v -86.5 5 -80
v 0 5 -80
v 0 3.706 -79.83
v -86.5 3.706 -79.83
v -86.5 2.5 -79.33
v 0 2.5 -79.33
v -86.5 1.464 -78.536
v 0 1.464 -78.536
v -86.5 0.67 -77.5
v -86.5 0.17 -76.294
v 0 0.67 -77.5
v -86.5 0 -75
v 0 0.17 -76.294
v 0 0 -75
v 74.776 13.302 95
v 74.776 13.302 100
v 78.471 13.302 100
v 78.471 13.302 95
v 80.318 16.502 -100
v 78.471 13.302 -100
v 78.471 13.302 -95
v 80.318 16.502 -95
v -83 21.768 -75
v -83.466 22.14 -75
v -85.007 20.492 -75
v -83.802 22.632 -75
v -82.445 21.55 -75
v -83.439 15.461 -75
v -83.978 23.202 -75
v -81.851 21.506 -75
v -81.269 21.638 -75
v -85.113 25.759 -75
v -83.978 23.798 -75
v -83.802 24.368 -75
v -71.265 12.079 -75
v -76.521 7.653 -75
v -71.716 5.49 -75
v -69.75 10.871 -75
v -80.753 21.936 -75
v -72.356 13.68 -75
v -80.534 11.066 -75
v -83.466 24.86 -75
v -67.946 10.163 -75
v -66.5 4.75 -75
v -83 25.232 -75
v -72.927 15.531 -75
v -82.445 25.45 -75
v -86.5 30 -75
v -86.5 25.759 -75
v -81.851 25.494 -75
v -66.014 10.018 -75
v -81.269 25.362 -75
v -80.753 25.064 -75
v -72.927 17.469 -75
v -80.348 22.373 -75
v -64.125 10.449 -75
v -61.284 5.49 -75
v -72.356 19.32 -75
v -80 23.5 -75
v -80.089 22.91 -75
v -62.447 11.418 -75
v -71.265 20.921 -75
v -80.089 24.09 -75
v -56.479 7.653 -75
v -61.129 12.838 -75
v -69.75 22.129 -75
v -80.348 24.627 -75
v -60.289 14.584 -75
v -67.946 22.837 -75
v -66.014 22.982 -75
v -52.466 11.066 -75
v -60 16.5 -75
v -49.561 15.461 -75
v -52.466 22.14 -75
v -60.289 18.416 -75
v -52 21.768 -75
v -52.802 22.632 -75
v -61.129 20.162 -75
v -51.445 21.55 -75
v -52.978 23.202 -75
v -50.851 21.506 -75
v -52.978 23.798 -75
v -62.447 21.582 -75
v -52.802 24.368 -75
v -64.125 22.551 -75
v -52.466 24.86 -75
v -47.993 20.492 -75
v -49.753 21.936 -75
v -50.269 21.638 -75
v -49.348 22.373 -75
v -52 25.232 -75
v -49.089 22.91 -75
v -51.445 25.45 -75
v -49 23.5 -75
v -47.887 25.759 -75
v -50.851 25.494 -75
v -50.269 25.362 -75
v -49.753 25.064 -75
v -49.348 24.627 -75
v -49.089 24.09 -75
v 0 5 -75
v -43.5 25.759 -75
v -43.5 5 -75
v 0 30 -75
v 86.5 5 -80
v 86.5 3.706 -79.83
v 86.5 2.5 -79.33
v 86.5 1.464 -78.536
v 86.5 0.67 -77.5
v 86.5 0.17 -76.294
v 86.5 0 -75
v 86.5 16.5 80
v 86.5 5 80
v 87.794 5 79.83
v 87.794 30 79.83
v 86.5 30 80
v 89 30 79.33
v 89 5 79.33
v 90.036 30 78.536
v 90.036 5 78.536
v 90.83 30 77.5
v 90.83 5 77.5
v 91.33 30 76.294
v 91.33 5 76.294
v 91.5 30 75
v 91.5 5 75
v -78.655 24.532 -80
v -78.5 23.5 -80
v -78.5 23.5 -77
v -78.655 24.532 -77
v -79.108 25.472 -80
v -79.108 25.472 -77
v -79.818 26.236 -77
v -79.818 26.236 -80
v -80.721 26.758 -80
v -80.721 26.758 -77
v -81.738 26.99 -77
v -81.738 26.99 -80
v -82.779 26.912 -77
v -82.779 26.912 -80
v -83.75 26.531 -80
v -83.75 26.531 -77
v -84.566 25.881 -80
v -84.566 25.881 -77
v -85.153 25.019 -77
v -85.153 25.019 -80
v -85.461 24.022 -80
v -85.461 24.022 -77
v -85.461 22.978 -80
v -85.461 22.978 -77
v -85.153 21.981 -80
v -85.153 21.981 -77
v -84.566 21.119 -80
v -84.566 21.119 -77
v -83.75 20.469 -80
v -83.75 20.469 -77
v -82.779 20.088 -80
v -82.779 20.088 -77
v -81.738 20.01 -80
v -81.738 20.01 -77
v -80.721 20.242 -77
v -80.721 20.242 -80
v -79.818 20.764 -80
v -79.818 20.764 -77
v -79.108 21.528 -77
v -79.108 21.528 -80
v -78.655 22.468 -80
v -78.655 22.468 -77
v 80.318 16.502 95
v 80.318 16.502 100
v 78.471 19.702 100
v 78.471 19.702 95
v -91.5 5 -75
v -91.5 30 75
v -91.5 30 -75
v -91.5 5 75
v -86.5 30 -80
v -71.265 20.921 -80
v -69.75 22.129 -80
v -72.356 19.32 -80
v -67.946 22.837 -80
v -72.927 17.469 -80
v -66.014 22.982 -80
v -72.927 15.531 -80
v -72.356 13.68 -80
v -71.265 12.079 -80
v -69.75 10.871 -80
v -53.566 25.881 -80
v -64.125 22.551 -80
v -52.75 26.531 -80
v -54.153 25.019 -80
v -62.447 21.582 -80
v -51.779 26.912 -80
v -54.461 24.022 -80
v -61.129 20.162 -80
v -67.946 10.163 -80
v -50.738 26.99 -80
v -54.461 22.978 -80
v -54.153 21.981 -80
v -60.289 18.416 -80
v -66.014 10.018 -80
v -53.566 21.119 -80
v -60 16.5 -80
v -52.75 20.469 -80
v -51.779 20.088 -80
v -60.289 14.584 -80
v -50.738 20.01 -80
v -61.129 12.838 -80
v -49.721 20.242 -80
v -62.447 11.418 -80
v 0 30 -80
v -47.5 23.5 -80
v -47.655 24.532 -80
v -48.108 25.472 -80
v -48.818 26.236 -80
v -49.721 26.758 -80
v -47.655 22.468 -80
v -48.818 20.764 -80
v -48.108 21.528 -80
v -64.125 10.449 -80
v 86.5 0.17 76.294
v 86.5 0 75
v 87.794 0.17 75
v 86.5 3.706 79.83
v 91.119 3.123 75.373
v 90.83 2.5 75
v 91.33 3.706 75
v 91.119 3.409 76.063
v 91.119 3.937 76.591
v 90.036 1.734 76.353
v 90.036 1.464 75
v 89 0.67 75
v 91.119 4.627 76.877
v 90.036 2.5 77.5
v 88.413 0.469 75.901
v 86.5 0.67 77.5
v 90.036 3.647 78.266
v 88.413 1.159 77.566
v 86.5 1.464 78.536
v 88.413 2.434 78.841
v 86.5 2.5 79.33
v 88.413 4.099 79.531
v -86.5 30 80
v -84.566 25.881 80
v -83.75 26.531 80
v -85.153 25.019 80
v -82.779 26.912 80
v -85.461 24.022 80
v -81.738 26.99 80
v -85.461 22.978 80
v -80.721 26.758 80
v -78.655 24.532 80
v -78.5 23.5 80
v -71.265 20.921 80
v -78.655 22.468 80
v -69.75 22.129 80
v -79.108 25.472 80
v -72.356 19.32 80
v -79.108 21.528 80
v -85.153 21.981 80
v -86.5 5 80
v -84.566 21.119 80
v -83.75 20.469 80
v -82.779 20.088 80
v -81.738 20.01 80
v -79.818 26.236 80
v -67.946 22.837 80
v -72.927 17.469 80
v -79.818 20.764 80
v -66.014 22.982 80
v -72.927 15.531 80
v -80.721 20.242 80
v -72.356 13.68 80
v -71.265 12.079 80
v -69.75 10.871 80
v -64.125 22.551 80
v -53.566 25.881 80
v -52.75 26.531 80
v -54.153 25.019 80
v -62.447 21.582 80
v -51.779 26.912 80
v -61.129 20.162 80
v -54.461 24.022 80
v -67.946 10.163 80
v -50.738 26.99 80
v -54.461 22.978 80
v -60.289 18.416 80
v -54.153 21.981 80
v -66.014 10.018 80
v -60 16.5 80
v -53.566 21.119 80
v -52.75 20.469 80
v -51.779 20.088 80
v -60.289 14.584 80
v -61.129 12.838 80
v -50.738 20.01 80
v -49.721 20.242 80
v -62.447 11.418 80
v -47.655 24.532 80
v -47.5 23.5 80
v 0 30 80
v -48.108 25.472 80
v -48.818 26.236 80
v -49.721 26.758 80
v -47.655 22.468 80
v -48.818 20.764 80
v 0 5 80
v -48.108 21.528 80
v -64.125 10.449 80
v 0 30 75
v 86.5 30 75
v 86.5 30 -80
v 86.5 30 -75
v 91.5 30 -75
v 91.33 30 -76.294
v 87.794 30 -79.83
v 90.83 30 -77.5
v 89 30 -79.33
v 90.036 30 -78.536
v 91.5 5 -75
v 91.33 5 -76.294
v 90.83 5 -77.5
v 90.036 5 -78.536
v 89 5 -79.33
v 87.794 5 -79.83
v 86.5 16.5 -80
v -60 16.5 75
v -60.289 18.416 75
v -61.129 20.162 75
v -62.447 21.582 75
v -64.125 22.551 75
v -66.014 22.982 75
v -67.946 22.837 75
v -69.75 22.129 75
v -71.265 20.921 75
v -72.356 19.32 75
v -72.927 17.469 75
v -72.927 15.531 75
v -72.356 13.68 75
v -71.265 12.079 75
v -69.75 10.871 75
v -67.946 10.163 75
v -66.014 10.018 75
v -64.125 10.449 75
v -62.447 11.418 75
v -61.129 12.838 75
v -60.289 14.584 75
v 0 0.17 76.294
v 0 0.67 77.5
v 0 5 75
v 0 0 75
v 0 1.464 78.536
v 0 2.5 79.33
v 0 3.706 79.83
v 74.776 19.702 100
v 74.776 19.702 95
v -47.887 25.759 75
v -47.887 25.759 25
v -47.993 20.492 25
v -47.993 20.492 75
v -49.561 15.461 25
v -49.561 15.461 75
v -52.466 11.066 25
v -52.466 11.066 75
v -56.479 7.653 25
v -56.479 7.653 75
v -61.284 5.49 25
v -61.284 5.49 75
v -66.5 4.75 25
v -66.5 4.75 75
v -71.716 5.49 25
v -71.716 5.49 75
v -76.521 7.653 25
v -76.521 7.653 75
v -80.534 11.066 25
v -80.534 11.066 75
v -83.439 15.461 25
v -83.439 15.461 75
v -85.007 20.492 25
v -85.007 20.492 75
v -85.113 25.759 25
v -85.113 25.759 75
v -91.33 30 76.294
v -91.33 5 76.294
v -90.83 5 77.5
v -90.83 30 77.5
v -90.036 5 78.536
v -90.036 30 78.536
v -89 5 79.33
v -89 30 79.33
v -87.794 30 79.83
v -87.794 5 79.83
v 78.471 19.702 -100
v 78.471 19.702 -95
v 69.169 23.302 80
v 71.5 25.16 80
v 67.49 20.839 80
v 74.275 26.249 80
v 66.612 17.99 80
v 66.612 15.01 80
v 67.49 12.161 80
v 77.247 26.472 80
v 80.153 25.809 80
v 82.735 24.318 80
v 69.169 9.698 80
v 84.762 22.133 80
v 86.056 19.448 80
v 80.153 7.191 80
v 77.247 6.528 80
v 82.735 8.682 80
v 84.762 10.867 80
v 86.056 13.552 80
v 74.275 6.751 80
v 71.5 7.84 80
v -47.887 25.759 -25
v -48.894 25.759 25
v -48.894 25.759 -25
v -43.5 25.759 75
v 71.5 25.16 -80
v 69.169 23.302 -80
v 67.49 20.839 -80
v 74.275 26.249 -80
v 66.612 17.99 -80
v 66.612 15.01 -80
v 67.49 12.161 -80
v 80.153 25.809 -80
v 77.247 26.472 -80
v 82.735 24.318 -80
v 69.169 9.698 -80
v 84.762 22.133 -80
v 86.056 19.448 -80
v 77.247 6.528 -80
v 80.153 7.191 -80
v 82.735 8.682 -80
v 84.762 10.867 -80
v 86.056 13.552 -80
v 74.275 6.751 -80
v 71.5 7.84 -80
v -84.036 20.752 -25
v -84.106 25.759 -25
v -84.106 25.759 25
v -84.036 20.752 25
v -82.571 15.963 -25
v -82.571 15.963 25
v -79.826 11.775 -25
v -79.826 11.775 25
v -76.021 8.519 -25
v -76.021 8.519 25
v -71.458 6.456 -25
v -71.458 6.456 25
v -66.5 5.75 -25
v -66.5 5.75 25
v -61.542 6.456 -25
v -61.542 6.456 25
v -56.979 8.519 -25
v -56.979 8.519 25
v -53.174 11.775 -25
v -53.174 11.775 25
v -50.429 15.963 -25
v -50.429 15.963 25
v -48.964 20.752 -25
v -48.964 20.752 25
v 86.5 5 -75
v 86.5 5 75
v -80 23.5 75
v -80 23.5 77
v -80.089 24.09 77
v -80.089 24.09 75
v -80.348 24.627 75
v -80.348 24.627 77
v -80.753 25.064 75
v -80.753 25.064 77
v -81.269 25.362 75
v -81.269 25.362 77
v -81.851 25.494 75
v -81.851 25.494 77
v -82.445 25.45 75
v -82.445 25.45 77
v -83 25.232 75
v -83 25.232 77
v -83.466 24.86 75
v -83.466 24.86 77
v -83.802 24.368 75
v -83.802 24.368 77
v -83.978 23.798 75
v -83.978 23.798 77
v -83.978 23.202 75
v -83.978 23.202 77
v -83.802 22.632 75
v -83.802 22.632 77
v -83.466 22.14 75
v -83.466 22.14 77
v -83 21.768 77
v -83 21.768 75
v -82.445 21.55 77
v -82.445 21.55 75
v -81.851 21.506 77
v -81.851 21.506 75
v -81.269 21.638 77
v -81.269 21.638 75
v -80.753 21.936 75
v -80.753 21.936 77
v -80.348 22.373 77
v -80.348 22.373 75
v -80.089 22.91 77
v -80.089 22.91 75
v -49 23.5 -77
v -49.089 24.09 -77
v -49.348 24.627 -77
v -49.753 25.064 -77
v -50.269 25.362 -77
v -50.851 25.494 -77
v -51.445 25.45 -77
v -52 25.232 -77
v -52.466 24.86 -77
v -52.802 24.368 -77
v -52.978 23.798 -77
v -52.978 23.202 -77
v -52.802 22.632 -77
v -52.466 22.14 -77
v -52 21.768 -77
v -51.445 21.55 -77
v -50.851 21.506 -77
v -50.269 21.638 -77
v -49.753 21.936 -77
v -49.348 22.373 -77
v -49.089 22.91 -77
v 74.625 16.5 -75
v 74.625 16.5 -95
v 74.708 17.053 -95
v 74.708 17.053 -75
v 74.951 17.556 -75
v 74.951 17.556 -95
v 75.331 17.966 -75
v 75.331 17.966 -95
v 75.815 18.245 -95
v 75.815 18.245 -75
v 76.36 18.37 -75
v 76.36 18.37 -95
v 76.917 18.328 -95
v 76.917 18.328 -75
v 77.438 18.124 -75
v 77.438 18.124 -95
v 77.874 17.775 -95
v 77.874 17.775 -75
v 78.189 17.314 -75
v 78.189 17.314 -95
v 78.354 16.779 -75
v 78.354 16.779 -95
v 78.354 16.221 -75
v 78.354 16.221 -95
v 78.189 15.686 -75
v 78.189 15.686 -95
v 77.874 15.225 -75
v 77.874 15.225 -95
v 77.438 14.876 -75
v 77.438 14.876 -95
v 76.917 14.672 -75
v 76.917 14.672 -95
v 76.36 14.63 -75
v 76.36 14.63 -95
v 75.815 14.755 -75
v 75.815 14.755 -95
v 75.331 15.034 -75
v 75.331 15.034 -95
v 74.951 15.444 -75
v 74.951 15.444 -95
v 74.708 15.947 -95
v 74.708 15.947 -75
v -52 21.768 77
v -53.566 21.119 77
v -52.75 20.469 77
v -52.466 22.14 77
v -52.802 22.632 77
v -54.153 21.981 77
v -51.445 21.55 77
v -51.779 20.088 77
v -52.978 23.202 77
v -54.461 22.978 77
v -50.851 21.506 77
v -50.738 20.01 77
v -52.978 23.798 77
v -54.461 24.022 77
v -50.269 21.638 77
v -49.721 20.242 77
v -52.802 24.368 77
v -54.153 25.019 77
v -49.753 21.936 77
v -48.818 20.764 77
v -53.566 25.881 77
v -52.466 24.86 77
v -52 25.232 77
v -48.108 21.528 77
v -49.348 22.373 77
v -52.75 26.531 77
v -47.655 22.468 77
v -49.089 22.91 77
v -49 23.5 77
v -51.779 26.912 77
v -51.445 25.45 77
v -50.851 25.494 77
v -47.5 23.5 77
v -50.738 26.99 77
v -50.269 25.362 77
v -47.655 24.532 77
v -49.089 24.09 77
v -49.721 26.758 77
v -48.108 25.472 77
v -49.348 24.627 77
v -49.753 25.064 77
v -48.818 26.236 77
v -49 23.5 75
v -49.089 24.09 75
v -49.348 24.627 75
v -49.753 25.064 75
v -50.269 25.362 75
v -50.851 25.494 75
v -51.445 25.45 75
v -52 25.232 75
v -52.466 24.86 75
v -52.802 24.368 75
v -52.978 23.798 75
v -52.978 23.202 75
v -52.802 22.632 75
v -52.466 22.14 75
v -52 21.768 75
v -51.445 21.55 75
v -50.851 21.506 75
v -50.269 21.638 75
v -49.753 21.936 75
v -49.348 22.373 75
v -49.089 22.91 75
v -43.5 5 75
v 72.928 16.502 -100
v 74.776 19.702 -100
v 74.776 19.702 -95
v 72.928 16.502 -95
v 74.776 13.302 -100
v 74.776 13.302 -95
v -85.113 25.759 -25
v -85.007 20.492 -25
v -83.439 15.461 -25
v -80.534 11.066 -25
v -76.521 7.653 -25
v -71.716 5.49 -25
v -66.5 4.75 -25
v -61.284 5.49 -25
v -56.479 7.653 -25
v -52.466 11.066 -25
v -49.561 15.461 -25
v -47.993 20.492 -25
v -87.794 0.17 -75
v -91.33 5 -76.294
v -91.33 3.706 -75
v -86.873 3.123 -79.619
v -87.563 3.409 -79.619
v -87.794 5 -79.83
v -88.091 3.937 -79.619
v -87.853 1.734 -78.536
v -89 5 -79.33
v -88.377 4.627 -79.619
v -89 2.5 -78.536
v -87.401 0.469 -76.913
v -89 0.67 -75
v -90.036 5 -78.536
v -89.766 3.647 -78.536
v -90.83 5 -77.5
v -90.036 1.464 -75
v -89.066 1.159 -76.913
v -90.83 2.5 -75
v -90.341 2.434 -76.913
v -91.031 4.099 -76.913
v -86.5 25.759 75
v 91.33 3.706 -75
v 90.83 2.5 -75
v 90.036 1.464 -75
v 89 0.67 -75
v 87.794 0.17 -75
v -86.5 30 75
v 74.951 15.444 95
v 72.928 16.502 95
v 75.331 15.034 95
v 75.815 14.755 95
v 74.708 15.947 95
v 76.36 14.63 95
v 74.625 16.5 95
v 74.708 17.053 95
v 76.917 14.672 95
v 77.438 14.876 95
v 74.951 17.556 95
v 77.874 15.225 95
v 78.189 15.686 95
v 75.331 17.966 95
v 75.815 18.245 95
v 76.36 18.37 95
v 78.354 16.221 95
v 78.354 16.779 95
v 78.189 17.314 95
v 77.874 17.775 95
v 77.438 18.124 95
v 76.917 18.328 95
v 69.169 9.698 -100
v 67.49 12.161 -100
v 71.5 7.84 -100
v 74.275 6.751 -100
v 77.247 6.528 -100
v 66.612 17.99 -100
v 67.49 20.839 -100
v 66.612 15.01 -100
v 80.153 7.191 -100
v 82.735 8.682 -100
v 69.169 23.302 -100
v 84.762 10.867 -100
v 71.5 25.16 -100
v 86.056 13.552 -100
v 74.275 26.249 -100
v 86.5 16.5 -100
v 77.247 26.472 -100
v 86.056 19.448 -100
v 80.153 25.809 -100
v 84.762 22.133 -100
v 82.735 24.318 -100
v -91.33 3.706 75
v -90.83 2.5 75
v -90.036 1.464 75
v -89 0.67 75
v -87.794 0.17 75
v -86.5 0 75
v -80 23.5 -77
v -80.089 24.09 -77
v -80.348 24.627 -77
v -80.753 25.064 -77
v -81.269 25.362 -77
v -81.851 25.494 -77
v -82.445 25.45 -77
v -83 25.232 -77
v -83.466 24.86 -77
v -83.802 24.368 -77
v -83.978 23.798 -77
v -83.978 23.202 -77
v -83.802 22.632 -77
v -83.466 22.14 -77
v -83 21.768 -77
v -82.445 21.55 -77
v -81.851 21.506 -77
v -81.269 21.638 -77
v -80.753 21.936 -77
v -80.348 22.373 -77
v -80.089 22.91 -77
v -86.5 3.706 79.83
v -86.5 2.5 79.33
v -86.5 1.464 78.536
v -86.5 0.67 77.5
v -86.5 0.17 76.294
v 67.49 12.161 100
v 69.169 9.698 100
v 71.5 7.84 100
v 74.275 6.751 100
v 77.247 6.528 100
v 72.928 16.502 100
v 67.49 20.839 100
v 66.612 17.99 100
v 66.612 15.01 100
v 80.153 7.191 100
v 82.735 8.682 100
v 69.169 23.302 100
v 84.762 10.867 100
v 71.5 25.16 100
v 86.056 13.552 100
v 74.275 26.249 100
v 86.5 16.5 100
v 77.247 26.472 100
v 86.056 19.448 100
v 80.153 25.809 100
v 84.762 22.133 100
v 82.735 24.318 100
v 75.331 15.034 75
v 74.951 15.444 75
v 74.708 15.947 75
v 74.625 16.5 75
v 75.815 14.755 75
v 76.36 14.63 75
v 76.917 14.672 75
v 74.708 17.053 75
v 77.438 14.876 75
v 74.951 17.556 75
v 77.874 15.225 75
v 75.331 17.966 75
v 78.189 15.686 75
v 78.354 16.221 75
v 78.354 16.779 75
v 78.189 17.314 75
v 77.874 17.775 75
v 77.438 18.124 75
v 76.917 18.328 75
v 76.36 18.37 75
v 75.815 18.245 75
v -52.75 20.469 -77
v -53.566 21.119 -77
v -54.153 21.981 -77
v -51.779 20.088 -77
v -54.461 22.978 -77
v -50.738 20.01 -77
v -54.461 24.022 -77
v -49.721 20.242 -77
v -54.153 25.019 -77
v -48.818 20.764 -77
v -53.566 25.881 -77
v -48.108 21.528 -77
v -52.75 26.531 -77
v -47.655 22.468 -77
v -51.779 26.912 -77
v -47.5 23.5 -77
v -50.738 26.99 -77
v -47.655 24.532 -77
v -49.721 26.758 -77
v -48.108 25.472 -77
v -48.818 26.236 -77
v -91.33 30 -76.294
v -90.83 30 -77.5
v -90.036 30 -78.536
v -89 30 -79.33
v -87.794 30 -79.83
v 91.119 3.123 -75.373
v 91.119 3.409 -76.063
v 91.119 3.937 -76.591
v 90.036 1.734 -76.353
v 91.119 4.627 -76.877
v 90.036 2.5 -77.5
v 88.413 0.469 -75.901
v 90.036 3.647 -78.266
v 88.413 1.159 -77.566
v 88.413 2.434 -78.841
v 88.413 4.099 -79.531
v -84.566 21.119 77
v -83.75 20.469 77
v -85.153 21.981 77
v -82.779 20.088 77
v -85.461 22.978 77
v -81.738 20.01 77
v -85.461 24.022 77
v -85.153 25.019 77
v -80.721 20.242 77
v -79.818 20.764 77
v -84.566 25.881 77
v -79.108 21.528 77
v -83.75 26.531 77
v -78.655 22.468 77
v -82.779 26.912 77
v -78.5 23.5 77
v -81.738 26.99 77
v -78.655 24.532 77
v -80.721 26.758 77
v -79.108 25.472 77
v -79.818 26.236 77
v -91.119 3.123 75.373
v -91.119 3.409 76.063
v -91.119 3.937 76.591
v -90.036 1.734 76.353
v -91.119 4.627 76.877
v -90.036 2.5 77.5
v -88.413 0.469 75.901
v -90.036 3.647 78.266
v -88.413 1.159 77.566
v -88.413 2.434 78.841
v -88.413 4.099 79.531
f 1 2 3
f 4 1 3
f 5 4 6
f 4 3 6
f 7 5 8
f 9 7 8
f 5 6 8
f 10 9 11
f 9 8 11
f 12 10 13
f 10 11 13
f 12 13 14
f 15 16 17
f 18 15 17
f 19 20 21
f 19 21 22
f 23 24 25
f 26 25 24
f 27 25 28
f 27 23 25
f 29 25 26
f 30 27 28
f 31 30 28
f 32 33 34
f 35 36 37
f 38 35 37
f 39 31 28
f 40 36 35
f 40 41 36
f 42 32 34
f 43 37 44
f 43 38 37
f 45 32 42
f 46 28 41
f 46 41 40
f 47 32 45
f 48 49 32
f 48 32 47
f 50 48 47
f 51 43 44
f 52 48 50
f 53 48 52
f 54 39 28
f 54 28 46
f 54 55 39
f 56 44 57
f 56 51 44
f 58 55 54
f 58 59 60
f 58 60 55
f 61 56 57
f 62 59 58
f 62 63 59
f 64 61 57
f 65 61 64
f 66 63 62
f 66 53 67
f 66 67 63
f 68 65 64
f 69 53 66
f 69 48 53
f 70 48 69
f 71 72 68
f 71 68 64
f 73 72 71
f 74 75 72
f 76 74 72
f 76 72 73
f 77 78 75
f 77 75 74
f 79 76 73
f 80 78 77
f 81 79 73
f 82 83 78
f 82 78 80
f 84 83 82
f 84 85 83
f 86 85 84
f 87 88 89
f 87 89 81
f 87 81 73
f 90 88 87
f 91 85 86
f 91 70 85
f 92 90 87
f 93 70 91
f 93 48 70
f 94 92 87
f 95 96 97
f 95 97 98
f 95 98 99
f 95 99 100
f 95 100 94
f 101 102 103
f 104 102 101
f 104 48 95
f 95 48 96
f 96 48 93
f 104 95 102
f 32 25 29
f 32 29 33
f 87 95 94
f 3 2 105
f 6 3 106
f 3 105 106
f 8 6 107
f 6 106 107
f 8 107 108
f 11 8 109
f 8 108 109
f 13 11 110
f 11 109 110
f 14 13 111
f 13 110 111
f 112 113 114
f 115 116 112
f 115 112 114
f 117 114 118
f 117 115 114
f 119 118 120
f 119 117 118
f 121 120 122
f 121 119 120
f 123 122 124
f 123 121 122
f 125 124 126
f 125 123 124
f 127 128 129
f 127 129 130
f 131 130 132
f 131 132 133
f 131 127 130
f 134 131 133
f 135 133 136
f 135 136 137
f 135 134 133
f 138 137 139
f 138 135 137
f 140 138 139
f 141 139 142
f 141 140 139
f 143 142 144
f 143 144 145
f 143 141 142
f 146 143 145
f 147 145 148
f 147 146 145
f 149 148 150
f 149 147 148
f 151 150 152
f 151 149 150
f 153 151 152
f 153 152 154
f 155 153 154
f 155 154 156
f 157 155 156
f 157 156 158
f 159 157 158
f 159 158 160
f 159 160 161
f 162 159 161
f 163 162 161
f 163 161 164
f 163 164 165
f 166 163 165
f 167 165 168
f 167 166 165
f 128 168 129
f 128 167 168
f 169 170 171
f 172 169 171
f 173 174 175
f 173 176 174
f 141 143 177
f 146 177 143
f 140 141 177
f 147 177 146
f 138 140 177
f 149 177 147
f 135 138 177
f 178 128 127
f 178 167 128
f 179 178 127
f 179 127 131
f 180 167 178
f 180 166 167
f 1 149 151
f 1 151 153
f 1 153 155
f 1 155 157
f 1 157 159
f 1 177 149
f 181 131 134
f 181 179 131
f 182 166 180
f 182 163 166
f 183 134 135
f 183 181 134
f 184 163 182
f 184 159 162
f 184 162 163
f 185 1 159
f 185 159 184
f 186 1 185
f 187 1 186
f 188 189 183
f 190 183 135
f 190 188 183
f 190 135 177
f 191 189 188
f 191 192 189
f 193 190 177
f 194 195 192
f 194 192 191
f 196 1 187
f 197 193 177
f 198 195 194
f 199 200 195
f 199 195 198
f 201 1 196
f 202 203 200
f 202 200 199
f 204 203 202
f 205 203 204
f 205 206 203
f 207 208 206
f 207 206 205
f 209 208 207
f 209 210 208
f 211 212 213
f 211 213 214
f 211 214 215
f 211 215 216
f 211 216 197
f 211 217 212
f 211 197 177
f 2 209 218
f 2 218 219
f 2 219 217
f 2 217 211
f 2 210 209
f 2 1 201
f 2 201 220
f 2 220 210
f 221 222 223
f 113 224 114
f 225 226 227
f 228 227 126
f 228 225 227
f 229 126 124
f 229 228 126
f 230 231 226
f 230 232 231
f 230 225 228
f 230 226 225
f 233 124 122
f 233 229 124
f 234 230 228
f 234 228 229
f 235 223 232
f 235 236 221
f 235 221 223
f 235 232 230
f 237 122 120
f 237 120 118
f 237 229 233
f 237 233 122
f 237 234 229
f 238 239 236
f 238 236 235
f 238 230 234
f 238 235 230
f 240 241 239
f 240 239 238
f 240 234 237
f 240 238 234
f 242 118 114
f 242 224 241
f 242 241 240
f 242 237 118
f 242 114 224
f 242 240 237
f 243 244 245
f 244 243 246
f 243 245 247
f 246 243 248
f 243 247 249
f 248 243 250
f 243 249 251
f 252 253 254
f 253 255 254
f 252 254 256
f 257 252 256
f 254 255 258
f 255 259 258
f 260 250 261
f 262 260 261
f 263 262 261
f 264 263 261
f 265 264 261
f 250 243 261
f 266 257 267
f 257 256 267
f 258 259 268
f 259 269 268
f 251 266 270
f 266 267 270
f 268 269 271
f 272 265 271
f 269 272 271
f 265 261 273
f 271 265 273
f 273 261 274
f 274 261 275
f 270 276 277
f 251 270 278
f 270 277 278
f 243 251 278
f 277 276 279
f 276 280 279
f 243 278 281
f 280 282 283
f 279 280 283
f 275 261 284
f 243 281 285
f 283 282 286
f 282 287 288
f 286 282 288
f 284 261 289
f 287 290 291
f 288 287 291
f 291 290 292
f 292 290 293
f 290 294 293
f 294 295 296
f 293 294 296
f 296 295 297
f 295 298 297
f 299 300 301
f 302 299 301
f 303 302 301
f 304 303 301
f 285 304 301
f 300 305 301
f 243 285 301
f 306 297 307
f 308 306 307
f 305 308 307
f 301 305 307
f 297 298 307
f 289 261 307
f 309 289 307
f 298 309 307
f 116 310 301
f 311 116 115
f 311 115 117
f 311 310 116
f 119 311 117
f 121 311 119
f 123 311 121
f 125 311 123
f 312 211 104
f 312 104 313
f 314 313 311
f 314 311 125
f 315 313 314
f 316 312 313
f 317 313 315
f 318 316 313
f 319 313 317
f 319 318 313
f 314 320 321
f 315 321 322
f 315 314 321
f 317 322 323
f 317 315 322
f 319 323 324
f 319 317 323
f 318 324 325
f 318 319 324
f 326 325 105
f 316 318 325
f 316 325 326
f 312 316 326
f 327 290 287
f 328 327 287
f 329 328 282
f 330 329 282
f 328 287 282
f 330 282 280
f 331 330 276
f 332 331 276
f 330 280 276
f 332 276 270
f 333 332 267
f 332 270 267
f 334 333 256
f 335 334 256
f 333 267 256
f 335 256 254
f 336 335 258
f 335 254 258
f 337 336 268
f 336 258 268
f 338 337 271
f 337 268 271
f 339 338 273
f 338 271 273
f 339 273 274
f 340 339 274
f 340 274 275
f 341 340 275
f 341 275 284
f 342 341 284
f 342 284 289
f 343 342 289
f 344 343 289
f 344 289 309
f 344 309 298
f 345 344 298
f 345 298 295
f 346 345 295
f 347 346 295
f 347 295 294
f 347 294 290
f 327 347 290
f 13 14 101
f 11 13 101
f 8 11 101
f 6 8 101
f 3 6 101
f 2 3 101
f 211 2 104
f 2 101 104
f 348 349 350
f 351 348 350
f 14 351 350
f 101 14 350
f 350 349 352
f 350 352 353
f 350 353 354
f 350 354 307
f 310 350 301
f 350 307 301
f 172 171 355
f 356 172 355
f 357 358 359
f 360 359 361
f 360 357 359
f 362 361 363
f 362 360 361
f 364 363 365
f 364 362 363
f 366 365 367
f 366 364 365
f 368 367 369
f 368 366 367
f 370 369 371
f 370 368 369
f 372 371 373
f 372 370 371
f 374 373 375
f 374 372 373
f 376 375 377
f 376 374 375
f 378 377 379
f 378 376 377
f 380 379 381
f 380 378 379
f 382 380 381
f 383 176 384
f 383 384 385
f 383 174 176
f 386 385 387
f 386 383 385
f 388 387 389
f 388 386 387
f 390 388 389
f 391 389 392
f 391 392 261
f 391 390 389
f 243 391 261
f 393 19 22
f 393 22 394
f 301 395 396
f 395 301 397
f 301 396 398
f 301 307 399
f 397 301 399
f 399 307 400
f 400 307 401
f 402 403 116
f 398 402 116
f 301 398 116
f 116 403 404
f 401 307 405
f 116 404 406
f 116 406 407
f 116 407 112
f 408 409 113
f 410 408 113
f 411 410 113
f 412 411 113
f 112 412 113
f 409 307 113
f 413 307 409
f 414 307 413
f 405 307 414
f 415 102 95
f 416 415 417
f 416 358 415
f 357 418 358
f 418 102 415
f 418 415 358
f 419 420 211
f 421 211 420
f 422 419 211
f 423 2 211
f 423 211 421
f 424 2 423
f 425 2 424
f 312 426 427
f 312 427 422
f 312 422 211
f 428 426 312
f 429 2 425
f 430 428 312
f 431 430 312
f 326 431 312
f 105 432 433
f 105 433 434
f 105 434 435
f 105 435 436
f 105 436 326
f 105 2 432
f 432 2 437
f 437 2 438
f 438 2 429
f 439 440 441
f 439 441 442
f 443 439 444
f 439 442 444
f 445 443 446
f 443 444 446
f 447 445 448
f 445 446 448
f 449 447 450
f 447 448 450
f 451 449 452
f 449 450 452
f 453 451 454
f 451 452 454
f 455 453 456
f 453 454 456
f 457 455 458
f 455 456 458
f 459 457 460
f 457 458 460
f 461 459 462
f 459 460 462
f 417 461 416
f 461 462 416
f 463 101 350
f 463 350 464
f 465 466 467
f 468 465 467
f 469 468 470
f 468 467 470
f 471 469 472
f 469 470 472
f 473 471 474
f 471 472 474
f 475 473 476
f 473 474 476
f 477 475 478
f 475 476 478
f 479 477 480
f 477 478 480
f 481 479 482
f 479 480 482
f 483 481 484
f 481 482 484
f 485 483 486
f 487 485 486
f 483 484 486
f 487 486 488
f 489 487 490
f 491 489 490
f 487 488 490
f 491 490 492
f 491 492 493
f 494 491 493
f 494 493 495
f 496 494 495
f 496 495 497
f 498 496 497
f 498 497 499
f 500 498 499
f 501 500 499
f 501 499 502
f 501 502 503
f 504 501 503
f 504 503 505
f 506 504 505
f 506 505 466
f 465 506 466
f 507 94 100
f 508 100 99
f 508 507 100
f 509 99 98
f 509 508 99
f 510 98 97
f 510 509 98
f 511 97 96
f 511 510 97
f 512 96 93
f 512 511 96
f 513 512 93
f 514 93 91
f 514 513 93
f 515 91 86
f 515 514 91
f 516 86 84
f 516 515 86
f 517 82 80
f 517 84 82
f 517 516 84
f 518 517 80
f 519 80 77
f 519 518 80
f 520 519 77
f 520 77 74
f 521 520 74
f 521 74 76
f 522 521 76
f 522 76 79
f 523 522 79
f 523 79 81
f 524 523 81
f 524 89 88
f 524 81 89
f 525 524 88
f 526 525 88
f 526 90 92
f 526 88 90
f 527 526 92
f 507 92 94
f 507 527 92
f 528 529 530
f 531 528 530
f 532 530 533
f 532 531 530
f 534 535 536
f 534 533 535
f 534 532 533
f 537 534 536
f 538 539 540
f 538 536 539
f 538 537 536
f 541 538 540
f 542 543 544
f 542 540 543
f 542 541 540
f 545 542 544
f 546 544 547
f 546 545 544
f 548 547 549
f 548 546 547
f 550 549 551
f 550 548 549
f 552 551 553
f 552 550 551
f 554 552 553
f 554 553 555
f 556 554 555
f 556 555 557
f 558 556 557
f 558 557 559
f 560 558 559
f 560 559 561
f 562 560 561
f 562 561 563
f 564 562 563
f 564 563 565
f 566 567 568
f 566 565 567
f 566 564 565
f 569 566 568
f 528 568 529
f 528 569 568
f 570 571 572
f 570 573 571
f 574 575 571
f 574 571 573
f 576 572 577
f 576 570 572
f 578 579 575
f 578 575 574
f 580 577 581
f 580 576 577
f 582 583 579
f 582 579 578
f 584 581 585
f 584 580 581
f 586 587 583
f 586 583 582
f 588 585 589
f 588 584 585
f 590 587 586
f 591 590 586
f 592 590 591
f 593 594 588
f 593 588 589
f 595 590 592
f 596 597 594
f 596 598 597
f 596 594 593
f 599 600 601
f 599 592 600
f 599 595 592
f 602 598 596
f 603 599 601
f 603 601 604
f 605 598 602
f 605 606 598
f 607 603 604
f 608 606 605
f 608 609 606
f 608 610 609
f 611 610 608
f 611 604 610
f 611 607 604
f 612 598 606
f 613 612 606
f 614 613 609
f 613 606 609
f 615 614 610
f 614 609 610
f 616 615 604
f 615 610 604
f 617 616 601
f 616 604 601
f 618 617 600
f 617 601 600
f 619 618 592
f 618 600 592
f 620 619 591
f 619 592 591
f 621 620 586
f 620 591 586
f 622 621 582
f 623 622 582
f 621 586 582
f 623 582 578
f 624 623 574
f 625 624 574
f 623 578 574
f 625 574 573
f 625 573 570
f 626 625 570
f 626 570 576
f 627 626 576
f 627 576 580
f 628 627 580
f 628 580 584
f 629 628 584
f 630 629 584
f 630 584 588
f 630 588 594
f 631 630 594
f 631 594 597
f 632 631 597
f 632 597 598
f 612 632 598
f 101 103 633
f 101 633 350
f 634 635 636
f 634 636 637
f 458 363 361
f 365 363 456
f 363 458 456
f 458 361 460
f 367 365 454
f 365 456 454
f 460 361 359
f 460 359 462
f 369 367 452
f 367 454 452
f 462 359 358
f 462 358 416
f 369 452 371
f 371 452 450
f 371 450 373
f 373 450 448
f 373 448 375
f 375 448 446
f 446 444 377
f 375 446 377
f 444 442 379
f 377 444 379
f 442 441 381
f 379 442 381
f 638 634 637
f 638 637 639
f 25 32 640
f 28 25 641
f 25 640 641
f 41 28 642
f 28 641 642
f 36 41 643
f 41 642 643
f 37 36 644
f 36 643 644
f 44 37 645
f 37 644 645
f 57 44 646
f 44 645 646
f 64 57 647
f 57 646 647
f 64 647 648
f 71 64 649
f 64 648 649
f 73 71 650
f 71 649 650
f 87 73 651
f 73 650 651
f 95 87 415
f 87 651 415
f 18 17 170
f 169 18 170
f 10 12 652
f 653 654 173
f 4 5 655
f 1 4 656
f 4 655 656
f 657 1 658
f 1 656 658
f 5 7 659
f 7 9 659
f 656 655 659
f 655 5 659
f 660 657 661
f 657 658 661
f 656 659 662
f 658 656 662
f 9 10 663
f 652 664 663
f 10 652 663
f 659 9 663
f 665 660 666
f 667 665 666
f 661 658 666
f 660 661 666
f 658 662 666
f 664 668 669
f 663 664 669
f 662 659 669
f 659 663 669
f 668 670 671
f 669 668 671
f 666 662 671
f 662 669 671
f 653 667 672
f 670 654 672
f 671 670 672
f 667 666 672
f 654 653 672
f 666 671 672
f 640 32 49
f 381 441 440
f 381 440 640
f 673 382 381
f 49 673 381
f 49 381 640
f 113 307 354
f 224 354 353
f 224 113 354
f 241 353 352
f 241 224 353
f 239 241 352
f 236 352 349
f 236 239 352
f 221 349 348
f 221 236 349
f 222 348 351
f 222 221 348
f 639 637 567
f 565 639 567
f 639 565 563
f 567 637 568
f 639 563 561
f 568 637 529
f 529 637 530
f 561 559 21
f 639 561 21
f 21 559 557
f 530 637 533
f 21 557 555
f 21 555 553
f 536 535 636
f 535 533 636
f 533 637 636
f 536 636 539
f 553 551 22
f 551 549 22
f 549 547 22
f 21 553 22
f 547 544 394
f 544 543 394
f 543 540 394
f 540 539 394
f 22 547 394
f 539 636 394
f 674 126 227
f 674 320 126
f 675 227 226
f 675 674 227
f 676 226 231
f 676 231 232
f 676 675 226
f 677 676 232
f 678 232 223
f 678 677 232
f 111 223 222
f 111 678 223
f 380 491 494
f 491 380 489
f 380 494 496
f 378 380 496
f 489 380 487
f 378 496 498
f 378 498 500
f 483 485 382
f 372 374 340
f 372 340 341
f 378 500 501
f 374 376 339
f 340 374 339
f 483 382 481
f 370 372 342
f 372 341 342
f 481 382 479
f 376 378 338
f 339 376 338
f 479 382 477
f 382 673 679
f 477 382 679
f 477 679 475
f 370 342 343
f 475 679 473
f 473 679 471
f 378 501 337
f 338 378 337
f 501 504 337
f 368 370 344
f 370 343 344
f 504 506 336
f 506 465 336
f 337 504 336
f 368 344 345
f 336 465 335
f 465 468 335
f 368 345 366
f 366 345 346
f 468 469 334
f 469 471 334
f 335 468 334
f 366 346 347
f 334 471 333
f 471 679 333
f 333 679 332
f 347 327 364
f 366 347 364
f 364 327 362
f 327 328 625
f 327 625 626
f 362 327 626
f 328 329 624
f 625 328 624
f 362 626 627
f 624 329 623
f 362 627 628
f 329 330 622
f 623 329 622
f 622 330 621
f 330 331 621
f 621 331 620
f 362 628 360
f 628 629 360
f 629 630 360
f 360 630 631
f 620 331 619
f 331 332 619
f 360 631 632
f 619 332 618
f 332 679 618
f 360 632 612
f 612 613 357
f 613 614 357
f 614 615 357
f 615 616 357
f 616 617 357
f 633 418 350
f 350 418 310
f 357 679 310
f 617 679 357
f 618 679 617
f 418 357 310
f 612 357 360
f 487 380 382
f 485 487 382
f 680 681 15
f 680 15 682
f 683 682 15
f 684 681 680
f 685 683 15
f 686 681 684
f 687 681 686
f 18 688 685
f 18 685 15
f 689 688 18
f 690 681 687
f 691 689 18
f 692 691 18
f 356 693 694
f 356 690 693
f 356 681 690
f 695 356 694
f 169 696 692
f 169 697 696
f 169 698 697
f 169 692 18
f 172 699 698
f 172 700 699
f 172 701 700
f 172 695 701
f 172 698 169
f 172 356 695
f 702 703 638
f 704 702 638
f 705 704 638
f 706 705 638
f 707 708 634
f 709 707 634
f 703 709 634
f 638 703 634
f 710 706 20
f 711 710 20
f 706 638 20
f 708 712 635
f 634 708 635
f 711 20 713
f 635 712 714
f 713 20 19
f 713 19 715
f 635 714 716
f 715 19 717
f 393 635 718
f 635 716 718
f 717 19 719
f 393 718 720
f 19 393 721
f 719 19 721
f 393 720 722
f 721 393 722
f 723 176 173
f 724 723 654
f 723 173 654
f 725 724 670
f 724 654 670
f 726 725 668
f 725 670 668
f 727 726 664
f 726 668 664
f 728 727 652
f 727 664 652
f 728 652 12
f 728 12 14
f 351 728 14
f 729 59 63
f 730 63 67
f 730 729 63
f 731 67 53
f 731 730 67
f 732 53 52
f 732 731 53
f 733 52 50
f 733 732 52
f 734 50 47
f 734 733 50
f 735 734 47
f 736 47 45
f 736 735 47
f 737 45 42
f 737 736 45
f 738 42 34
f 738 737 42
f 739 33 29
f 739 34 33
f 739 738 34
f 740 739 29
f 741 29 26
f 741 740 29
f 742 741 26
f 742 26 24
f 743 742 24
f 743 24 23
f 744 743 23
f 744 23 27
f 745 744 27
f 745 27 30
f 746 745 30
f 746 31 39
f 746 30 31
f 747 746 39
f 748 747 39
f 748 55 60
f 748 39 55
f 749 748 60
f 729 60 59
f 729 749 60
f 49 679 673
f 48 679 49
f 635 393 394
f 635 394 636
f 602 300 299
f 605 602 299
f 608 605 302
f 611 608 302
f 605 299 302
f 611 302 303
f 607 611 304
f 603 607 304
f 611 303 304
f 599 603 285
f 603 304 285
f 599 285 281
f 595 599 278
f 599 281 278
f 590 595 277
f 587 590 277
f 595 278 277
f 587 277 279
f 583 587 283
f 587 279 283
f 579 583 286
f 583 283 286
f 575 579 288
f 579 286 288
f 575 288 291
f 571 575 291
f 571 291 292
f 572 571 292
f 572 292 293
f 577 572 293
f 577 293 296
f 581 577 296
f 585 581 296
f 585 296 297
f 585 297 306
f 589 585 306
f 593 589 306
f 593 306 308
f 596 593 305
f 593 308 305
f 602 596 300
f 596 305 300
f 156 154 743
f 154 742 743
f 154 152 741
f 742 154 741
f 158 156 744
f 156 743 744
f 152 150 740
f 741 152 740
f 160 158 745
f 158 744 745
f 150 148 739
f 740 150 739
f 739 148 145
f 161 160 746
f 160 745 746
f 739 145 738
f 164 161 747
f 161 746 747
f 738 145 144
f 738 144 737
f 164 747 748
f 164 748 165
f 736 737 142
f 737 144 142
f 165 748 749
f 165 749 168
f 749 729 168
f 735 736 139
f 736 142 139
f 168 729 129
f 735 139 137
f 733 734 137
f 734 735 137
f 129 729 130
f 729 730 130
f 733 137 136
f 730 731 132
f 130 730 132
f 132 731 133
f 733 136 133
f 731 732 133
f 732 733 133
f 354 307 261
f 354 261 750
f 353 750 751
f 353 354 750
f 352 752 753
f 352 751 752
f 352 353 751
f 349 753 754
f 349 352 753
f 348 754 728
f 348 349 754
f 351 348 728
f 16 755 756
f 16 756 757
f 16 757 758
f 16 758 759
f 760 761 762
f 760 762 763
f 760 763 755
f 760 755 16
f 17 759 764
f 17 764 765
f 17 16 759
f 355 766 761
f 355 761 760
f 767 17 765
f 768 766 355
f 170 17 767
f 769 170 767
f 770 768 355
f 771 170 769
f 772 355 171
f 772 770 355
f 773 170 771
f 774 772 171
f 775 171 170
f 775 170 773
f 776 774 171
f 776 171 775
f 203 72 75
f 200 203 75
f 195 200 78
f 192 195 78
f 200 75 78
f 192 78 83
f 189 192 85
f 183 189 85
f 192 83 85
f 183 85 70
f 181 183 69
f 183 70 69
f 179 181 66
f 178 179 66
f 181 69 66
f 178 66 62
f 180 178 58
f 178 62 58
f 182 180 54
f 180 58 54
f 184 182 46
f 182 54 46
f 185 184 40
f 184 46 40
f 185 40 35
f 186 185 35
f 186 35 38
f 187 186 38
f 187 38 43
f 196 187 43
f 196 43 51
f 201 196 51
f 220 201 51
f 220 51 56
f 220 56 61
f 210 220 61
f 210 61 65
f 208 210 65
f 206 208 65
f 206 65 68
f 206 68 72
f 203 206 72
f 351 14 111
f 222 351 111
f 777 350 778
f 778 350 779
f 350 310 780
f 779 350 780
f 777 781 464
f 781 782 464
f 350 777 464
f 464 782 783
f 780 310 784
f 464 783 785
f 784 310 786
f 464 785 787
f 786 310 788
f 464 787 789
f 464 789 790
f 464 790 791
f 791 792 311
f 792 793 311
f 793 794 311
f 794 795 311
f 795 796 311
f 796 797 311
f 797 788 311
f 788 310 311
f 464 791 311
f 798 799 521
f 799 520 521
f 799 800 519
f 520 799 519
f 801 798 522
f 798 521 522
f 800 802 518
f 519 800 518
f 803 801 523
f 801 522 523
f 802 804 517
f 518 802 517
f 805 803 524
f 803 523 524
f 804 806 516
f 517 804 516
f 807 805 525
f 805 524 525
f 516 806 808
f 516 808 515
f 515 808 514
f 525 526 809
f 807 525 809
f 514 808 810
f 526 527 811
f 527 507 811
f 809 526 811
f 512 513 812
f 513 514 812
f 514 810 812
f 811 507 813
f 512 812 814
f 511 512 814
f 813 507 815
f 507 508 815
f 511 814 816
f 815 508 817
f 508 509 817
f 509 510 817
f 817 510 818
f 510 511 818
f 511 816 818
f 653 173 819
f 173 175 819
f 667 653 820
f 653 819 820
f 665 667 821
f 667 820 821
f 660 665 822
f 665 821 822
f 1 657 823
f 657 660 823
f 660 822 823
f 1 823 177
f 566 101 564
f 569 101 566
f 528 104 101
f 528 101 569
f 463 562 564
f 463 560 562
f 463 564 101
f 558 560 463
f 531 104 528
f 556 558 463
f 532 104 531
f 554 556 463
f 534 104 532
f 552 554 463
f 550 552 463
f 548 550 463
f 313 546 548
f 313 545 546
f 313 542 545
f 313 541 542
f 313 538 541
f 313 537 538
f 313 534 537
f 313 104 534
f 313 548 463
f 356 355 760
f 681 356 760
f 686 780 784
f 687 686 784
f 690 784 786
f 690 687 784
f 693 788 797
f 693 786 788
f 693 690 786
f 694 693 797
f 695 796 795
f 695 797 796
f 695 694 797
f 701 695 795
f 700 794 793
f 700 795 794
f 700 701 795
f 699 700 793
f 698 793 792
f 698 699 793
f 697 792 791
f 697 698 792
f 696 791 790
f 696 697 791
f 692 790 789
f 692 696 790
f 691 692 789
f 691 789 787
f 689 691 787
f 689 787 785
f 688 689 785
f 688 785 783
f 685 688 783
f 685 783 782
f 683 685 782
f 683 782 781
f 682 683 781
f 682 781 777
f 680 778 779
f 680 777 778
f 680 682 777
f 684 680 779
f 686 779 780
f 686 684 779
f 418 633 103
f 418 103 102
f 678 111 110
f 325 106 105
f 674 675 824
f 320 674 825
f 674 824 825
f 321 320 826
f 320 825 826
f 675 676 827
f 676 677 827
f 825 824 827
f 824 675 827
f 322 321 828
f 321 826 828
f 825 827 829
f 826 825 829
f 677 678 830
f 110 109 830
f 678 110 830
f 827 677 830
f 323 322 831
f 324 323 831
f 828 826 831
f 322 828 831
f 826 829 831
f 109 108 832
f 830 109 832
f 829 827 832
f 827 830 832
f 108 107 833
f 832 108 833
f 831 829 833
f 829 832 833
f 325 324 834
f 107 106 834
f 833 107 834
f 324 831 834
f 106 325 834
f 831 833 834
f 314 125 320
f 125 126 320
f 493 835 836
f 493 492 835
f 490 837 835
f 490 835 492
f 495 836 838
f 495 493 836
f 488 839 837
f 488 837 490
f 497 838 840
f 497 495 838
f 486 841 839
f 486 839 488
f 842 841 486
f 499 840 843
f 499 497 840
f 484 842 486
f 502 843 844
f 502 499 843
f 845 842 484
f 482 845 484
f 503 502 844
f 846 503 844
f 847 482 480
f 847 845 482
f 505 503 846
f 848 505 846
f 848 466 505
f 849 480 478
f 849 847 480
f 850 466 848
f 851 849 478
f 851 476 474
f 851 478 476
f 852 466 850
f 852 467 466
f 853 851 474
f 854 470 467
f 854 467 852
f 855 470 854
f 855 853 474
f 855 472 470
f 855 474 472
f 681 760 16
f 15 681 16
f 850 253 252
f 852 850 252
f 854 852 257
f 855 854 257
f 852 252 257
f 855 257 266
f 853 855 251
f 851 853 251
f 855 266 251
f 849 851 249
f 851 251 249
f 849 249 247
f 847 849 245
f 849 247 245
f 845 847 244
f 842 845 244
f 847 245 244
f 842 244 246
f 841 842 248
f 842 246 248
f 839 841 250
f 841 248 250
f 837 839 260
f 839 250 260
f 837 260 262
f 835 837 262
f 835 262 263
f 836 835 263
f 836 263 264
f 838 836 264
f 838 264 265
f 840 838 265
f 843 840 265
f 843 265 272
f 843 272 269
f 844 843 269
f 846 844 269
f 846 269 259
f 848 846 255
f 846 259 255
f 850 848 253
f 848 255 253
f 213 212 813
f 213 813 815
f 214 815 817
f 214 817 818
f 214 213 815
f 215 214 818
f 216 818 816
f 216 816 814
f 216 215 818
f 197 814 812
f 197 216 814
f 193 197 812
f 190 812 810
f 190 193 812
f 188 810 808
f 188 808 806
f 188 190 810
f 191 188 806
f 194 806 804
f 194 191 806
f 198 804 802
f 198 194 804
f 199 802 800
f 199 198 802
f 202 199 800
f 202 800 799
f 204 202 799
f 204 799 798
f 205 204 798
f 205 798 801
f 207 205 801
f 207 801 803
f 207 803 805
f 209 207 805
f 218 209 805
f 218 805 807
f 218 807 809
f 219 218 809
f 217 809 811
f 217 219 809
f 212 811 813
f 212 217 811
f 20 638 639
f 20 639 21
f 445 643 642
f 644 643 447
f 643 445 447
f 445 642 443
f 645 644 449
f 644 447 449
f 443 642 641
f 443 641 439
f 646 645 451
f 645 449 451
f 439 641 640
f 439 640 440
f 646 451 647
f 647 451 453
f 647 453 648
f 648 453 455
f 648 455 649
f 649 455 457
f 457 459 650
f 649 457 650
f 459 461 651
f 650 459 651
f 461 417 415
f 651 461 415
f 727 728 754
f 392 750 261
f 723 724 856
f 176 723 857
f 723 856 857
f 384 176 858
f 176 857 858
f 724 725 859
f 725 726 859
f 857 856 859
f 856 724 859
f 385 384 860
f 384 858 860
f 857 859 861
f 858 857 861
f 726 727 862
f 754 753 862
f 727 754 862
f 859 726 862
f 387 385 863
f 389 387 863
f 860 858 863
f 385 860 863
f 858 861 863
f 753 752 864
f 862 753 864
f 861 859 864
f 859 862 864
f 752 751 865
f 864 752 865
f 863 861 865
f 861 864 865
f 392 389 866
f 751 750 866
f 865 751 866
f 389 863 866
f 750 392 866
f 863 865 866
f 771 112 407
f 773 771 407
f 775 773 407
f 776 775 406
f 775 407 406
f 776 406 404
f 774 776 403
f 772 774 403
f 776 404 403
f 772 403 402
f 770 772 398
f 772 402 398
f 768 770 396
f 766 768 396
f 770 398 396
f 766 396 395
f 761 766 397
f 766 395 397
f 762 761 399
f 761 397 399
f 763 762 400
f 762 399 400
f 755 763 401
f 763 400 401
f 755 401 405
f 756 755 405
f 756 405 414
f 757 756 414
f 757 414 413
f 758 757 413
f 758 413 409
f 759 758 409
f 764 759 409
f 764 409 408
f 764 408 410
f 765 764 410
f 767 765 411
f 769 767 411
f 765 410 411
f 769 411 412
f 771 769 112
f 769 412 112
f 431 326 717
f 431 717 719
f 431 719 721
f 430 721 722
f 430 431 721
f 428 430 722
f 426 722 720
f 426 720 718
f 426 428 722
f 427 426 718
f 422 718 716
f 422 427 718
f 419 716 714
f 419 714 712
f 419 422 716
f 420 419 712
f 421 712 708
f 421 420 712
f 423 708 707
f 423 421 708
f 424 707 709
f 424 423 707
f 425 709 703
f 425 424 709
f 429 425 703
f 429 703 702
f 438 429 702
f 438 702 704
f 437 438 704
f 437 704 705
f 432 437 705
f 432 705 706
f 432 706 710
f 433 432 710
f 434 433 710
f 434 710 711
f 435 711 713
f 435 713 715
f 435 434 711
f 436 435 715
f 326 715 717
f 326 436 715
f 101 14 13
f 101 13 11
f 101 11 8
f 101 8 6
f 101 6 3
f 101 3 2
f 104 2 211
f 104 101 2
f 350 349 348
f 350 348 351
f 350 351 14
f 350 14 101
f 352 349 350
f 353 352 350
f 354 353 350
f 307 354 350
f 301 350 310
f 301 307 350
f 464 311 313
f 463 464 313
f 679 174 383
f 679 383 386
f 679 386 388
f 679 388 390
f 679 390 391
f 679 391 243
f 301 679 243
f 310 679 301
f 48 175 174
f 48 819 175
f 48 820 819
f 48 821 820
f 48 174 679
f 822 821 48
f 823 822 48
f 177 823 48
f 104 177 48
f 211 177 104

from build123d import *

# Parameters (mm, degrees)
SKETCH5_W                = 183
SKETCH5_H                = 160
BOSS_EXTRUDE3_DEPTH      = 30
SKETCH6_W                = 173
SKETCH6_H                = 150
CUT_EXTRUDE1_DEPTH       = 25
SKETCH7_R                = 6.5
SKETCH7_R_2              = 1
CUT_EXTRUDE2_DEPTH       = 187.741130981
SKETCH11_W               = 43
SKETCH11_H               = 20.759163428
BOSS_EXTRUDE4_DEPTH      = 150
SKETCH8_R                = 18.75
CUT_EXTRUDE4_DEPTH       = 50
SKETCH12_R               = 17.75
CUT_EXTRUDE5_DEPTH       = 100
SKETCH13_R               = 3.5
CUT_EXTRUDE6_DEPTH       = 3
SKETCH14_R               = 2
CUT_EXTRUDE7_DEPTH       = 3
FILLET1_R                = 5
CUT_EXTRUDE8_DEPTH       = 0.0001
CUT_EXTRUDE9_START       = 50
SKETCH16_R               = 18.75
CUT_EXTRUDE9_DEPTH       = 50
SKETCH17_R               = 10
BOSS_EXTRUDE5_DEPTH      = 20
CUT_EXTRUDE10_DEPTH      = 200.742959826
CUT_EXTRUDE10_DEPTH_BACK = 200.742959826
SKETCH18_R               = 1.875
CUT_EXTRUDE11_DEPTH      = 5


# Read off the part's stored shape, not the designer's step: Cut-Extrude8
with BuildPart() as part:
    # Sketch5 → Boss-Extrude3 (new body)
    with BuildSketch(Plane(origin=(0, 0, 0), x_dir=(1, 0, 0), z_dir=(0, 1, 0))):
        Rectangle(SKETCH5_W, SKETCH5_H)
    extrude(amount=BOSS_EXTRUDE3_DEPTH)

    # Sketch6 → Cut-Extrude1 (cut)
    with BuildSketch(Plane(origin=(0, 30, 0), x_dir=(1, 0, 0), z_dir=(0, 1, 0))):
        Rectangle(SKETCH6_W, SKETCH6_H)
    extrude(amount=-CUT_EXTRUDE1_DEPTH, mode=Mode.SUBTRACT)

    # Sketch7 → Cut-Extrude2 (cut, through all)
    with BuildSketch(Plane.XY.offset(80)):
        with Locations((-66.5, 16.5)):
            Circle(SKETCH7_R)
        with Locations((76.5, 16.5)):
            Circle(SKETCH7_R_2)
    extrude(amount=-CUT_EXTRUDE2_DEPTH, mode=Mode.SUBTRACT)

    # Sketch11 → Boss-Extrude4 (add)
    with BuildSketch(Plane(origin=(0, 0, 75), x_dir=(-1, 0, 0), z_dir=(0, 0, -1))):
        with Locations((65, 15.379581714)):
            Rectangle(SKETCH11_W, SKETCH11_H)
    extrude(amount=BOSS_EXTRUDE4_DEPTH)

    # Sketch8 → Cut-Extrude4 (cut)
    with BuildSketch(Plane(origin=(0, 0, 75), x_dir=(-1, 0, 0), z_dir=(0, 0, -1))):
        with Locations((66.5, 23.5)):
            Circle(SKETCH8_R)
    extrude(amount=CUT_EXTRUDE4_DEPTH, mode=Mode.SUBTRACT)

    # Sketch12 → Cut-Extrude5 (cut)
    with BuildSketch(Plane.XY.offset(25)):
        with Locations((-66.5, 23.5)):
            Circle(SKETCH12_R)
    extrude(amount=-CUT_EXTRUDE5_DEPTH, mode=Mode.SUBTRACT)

    # Sketch13 → Cut-Extrude6 (cut)
    with BuildSketch(Plane.XY.offset(80)):
        with Locations((-51, 23.5)):
            Circle(SKETCH13_R)
        with Locations((-82, 23.5)):
            Circle(SKETCH13_R)
    cut_extrude6 = extrude(amount=-CUT_EXTRUDE6_DEPTH, mode=Mode.SUBTRACT)

    # Sketch14 → Cut-Extrude7 (cut)
    with BuildSketch(Plane.XY.offset(77)):
        with Locations((-51, 23.5)):
            Circle(SKETCH14_R)
        with Locations((-82, 23.5)):
            Circle(SKETCH14_R)
    cut_extrude7 = extrude(amount=-CUT_EXTRUDE7_DEPTH, mode=Mode.SUBTRACT)

    # Mirror2: Cut-Extrude6, Cut-Extrude7 across plane
    add(cut_extrude6.mirror(Plane.XY), mode=Mode.SUBTRACT)
    add(cut_extrude7.mirror(Plane.XY), mode=Mode.SUBTRACT)

    # Fillet1
    fillet1_edges = [part.edges().sort_by_distance(p)[0] for p in [
        (0, 0, 80),
        (-91.5, 0, 0),
        (0, 0, -80),
        (91.5, 0, 0),
        (91.5, 15, 80),
        (-91.5, 15, 80),
        (-91.5, 15, -80),
        (91.5, 15, -80),
    ]]
    fillet(fillet1_edges, radius=FILLET1_R)

    # Cut-Extrude8 outline → Cut-Extrude8 (cut)
    with BuildSketch(Plane.YZ):
        with BuildLine():
            Line((5, 75), (30, 75))
            Line((30, 75), (30, 80))
            Line((30, 80), (5, 80))
            ThreePointArc((5, 80), (1.464466094, 78.535533906), (0, 75))
            Line((0, 75), (0, -75))
            ThreePointArc((0, -75), (1.464466094, -78.535533906), (5, -80))
            Line((5, -80), (30, -80))
            Line((30, -80), (30, -75))
            Line((30, -75), (5, -75))
            Line((5, -75), (5, 75))
        make_face()
    extrude(amount=CUT_EXTRUDE8_DEPTH, mode=Mode.SUBTRACT)

    # Sketch16 → Cut-Extrude9 (cut)
    with BuildSketch(Plane.XY.offset(-75).offset(CUT_EXTRUDE9_START)):
        with Locations((-66.5, 23.5)):
            Circle(SKETCH16_R)
    extrude(amount=-CUT_EXTRUDE9_DEPTH, mode=Mode.SUBTRACT)

    # Sketch17 → Boss-Extrude5 (add)
    with BuildSketch(Plane.XY.offset(80)):
        with Locations((76.5, 16.5)):
            Circle(SKETCH17_R)
    boss_extrude5 = extrude(amount=BOSS_EXTRUDE5_DEPTH)

    # Mirror3: Boss-Extrude5 across plane
    add(boss_extrude5.mirror(Plane.XY))

    # Sketch18 → Cut-Extrude10 (cut, two sides: drawn at the far end of the back side and taken through both)
    with BuildSketch(Plane(origin=(0, 0, 75), x_dir=(-1, 0, 0), z_dir=(0, 0, -1)).offset(-CUT_EXTRUDE10_DEPTH_BACK)):
        with Locations((-76.5, 16.5)):
            Circle(SKETCH18_R)
    extrude(amount=CUT_EXTRUDE10_DEPTH + CUT_EXTRUDE10_DEPTH_BACK, mode=Mode.SUBTRACT)

    # Sketch19 → Cut-Extrude11 (cut)
    with BuildSketch(Plane.XY.offset(100)):
        Polygon((80.318153676, 16.502326977), (78.470632815, 19.702326977), (74.775591092, 19.702326977), (72.92807023, 16.502326977), (74.775591092, 13.302326977), (78.470632815, 13.302326977), align=None)
    cut_extrude11 = extrude(amount=-CUT_EXTRUDE11_DEPTH, mode=Mode.SUBTRACT)

    # Mirror4: Cut-Extrude11 across plane
    add(cut_extrude11.mirror(Plane.XY), mode=Mode.SUBTRACT)


solid = part.part
